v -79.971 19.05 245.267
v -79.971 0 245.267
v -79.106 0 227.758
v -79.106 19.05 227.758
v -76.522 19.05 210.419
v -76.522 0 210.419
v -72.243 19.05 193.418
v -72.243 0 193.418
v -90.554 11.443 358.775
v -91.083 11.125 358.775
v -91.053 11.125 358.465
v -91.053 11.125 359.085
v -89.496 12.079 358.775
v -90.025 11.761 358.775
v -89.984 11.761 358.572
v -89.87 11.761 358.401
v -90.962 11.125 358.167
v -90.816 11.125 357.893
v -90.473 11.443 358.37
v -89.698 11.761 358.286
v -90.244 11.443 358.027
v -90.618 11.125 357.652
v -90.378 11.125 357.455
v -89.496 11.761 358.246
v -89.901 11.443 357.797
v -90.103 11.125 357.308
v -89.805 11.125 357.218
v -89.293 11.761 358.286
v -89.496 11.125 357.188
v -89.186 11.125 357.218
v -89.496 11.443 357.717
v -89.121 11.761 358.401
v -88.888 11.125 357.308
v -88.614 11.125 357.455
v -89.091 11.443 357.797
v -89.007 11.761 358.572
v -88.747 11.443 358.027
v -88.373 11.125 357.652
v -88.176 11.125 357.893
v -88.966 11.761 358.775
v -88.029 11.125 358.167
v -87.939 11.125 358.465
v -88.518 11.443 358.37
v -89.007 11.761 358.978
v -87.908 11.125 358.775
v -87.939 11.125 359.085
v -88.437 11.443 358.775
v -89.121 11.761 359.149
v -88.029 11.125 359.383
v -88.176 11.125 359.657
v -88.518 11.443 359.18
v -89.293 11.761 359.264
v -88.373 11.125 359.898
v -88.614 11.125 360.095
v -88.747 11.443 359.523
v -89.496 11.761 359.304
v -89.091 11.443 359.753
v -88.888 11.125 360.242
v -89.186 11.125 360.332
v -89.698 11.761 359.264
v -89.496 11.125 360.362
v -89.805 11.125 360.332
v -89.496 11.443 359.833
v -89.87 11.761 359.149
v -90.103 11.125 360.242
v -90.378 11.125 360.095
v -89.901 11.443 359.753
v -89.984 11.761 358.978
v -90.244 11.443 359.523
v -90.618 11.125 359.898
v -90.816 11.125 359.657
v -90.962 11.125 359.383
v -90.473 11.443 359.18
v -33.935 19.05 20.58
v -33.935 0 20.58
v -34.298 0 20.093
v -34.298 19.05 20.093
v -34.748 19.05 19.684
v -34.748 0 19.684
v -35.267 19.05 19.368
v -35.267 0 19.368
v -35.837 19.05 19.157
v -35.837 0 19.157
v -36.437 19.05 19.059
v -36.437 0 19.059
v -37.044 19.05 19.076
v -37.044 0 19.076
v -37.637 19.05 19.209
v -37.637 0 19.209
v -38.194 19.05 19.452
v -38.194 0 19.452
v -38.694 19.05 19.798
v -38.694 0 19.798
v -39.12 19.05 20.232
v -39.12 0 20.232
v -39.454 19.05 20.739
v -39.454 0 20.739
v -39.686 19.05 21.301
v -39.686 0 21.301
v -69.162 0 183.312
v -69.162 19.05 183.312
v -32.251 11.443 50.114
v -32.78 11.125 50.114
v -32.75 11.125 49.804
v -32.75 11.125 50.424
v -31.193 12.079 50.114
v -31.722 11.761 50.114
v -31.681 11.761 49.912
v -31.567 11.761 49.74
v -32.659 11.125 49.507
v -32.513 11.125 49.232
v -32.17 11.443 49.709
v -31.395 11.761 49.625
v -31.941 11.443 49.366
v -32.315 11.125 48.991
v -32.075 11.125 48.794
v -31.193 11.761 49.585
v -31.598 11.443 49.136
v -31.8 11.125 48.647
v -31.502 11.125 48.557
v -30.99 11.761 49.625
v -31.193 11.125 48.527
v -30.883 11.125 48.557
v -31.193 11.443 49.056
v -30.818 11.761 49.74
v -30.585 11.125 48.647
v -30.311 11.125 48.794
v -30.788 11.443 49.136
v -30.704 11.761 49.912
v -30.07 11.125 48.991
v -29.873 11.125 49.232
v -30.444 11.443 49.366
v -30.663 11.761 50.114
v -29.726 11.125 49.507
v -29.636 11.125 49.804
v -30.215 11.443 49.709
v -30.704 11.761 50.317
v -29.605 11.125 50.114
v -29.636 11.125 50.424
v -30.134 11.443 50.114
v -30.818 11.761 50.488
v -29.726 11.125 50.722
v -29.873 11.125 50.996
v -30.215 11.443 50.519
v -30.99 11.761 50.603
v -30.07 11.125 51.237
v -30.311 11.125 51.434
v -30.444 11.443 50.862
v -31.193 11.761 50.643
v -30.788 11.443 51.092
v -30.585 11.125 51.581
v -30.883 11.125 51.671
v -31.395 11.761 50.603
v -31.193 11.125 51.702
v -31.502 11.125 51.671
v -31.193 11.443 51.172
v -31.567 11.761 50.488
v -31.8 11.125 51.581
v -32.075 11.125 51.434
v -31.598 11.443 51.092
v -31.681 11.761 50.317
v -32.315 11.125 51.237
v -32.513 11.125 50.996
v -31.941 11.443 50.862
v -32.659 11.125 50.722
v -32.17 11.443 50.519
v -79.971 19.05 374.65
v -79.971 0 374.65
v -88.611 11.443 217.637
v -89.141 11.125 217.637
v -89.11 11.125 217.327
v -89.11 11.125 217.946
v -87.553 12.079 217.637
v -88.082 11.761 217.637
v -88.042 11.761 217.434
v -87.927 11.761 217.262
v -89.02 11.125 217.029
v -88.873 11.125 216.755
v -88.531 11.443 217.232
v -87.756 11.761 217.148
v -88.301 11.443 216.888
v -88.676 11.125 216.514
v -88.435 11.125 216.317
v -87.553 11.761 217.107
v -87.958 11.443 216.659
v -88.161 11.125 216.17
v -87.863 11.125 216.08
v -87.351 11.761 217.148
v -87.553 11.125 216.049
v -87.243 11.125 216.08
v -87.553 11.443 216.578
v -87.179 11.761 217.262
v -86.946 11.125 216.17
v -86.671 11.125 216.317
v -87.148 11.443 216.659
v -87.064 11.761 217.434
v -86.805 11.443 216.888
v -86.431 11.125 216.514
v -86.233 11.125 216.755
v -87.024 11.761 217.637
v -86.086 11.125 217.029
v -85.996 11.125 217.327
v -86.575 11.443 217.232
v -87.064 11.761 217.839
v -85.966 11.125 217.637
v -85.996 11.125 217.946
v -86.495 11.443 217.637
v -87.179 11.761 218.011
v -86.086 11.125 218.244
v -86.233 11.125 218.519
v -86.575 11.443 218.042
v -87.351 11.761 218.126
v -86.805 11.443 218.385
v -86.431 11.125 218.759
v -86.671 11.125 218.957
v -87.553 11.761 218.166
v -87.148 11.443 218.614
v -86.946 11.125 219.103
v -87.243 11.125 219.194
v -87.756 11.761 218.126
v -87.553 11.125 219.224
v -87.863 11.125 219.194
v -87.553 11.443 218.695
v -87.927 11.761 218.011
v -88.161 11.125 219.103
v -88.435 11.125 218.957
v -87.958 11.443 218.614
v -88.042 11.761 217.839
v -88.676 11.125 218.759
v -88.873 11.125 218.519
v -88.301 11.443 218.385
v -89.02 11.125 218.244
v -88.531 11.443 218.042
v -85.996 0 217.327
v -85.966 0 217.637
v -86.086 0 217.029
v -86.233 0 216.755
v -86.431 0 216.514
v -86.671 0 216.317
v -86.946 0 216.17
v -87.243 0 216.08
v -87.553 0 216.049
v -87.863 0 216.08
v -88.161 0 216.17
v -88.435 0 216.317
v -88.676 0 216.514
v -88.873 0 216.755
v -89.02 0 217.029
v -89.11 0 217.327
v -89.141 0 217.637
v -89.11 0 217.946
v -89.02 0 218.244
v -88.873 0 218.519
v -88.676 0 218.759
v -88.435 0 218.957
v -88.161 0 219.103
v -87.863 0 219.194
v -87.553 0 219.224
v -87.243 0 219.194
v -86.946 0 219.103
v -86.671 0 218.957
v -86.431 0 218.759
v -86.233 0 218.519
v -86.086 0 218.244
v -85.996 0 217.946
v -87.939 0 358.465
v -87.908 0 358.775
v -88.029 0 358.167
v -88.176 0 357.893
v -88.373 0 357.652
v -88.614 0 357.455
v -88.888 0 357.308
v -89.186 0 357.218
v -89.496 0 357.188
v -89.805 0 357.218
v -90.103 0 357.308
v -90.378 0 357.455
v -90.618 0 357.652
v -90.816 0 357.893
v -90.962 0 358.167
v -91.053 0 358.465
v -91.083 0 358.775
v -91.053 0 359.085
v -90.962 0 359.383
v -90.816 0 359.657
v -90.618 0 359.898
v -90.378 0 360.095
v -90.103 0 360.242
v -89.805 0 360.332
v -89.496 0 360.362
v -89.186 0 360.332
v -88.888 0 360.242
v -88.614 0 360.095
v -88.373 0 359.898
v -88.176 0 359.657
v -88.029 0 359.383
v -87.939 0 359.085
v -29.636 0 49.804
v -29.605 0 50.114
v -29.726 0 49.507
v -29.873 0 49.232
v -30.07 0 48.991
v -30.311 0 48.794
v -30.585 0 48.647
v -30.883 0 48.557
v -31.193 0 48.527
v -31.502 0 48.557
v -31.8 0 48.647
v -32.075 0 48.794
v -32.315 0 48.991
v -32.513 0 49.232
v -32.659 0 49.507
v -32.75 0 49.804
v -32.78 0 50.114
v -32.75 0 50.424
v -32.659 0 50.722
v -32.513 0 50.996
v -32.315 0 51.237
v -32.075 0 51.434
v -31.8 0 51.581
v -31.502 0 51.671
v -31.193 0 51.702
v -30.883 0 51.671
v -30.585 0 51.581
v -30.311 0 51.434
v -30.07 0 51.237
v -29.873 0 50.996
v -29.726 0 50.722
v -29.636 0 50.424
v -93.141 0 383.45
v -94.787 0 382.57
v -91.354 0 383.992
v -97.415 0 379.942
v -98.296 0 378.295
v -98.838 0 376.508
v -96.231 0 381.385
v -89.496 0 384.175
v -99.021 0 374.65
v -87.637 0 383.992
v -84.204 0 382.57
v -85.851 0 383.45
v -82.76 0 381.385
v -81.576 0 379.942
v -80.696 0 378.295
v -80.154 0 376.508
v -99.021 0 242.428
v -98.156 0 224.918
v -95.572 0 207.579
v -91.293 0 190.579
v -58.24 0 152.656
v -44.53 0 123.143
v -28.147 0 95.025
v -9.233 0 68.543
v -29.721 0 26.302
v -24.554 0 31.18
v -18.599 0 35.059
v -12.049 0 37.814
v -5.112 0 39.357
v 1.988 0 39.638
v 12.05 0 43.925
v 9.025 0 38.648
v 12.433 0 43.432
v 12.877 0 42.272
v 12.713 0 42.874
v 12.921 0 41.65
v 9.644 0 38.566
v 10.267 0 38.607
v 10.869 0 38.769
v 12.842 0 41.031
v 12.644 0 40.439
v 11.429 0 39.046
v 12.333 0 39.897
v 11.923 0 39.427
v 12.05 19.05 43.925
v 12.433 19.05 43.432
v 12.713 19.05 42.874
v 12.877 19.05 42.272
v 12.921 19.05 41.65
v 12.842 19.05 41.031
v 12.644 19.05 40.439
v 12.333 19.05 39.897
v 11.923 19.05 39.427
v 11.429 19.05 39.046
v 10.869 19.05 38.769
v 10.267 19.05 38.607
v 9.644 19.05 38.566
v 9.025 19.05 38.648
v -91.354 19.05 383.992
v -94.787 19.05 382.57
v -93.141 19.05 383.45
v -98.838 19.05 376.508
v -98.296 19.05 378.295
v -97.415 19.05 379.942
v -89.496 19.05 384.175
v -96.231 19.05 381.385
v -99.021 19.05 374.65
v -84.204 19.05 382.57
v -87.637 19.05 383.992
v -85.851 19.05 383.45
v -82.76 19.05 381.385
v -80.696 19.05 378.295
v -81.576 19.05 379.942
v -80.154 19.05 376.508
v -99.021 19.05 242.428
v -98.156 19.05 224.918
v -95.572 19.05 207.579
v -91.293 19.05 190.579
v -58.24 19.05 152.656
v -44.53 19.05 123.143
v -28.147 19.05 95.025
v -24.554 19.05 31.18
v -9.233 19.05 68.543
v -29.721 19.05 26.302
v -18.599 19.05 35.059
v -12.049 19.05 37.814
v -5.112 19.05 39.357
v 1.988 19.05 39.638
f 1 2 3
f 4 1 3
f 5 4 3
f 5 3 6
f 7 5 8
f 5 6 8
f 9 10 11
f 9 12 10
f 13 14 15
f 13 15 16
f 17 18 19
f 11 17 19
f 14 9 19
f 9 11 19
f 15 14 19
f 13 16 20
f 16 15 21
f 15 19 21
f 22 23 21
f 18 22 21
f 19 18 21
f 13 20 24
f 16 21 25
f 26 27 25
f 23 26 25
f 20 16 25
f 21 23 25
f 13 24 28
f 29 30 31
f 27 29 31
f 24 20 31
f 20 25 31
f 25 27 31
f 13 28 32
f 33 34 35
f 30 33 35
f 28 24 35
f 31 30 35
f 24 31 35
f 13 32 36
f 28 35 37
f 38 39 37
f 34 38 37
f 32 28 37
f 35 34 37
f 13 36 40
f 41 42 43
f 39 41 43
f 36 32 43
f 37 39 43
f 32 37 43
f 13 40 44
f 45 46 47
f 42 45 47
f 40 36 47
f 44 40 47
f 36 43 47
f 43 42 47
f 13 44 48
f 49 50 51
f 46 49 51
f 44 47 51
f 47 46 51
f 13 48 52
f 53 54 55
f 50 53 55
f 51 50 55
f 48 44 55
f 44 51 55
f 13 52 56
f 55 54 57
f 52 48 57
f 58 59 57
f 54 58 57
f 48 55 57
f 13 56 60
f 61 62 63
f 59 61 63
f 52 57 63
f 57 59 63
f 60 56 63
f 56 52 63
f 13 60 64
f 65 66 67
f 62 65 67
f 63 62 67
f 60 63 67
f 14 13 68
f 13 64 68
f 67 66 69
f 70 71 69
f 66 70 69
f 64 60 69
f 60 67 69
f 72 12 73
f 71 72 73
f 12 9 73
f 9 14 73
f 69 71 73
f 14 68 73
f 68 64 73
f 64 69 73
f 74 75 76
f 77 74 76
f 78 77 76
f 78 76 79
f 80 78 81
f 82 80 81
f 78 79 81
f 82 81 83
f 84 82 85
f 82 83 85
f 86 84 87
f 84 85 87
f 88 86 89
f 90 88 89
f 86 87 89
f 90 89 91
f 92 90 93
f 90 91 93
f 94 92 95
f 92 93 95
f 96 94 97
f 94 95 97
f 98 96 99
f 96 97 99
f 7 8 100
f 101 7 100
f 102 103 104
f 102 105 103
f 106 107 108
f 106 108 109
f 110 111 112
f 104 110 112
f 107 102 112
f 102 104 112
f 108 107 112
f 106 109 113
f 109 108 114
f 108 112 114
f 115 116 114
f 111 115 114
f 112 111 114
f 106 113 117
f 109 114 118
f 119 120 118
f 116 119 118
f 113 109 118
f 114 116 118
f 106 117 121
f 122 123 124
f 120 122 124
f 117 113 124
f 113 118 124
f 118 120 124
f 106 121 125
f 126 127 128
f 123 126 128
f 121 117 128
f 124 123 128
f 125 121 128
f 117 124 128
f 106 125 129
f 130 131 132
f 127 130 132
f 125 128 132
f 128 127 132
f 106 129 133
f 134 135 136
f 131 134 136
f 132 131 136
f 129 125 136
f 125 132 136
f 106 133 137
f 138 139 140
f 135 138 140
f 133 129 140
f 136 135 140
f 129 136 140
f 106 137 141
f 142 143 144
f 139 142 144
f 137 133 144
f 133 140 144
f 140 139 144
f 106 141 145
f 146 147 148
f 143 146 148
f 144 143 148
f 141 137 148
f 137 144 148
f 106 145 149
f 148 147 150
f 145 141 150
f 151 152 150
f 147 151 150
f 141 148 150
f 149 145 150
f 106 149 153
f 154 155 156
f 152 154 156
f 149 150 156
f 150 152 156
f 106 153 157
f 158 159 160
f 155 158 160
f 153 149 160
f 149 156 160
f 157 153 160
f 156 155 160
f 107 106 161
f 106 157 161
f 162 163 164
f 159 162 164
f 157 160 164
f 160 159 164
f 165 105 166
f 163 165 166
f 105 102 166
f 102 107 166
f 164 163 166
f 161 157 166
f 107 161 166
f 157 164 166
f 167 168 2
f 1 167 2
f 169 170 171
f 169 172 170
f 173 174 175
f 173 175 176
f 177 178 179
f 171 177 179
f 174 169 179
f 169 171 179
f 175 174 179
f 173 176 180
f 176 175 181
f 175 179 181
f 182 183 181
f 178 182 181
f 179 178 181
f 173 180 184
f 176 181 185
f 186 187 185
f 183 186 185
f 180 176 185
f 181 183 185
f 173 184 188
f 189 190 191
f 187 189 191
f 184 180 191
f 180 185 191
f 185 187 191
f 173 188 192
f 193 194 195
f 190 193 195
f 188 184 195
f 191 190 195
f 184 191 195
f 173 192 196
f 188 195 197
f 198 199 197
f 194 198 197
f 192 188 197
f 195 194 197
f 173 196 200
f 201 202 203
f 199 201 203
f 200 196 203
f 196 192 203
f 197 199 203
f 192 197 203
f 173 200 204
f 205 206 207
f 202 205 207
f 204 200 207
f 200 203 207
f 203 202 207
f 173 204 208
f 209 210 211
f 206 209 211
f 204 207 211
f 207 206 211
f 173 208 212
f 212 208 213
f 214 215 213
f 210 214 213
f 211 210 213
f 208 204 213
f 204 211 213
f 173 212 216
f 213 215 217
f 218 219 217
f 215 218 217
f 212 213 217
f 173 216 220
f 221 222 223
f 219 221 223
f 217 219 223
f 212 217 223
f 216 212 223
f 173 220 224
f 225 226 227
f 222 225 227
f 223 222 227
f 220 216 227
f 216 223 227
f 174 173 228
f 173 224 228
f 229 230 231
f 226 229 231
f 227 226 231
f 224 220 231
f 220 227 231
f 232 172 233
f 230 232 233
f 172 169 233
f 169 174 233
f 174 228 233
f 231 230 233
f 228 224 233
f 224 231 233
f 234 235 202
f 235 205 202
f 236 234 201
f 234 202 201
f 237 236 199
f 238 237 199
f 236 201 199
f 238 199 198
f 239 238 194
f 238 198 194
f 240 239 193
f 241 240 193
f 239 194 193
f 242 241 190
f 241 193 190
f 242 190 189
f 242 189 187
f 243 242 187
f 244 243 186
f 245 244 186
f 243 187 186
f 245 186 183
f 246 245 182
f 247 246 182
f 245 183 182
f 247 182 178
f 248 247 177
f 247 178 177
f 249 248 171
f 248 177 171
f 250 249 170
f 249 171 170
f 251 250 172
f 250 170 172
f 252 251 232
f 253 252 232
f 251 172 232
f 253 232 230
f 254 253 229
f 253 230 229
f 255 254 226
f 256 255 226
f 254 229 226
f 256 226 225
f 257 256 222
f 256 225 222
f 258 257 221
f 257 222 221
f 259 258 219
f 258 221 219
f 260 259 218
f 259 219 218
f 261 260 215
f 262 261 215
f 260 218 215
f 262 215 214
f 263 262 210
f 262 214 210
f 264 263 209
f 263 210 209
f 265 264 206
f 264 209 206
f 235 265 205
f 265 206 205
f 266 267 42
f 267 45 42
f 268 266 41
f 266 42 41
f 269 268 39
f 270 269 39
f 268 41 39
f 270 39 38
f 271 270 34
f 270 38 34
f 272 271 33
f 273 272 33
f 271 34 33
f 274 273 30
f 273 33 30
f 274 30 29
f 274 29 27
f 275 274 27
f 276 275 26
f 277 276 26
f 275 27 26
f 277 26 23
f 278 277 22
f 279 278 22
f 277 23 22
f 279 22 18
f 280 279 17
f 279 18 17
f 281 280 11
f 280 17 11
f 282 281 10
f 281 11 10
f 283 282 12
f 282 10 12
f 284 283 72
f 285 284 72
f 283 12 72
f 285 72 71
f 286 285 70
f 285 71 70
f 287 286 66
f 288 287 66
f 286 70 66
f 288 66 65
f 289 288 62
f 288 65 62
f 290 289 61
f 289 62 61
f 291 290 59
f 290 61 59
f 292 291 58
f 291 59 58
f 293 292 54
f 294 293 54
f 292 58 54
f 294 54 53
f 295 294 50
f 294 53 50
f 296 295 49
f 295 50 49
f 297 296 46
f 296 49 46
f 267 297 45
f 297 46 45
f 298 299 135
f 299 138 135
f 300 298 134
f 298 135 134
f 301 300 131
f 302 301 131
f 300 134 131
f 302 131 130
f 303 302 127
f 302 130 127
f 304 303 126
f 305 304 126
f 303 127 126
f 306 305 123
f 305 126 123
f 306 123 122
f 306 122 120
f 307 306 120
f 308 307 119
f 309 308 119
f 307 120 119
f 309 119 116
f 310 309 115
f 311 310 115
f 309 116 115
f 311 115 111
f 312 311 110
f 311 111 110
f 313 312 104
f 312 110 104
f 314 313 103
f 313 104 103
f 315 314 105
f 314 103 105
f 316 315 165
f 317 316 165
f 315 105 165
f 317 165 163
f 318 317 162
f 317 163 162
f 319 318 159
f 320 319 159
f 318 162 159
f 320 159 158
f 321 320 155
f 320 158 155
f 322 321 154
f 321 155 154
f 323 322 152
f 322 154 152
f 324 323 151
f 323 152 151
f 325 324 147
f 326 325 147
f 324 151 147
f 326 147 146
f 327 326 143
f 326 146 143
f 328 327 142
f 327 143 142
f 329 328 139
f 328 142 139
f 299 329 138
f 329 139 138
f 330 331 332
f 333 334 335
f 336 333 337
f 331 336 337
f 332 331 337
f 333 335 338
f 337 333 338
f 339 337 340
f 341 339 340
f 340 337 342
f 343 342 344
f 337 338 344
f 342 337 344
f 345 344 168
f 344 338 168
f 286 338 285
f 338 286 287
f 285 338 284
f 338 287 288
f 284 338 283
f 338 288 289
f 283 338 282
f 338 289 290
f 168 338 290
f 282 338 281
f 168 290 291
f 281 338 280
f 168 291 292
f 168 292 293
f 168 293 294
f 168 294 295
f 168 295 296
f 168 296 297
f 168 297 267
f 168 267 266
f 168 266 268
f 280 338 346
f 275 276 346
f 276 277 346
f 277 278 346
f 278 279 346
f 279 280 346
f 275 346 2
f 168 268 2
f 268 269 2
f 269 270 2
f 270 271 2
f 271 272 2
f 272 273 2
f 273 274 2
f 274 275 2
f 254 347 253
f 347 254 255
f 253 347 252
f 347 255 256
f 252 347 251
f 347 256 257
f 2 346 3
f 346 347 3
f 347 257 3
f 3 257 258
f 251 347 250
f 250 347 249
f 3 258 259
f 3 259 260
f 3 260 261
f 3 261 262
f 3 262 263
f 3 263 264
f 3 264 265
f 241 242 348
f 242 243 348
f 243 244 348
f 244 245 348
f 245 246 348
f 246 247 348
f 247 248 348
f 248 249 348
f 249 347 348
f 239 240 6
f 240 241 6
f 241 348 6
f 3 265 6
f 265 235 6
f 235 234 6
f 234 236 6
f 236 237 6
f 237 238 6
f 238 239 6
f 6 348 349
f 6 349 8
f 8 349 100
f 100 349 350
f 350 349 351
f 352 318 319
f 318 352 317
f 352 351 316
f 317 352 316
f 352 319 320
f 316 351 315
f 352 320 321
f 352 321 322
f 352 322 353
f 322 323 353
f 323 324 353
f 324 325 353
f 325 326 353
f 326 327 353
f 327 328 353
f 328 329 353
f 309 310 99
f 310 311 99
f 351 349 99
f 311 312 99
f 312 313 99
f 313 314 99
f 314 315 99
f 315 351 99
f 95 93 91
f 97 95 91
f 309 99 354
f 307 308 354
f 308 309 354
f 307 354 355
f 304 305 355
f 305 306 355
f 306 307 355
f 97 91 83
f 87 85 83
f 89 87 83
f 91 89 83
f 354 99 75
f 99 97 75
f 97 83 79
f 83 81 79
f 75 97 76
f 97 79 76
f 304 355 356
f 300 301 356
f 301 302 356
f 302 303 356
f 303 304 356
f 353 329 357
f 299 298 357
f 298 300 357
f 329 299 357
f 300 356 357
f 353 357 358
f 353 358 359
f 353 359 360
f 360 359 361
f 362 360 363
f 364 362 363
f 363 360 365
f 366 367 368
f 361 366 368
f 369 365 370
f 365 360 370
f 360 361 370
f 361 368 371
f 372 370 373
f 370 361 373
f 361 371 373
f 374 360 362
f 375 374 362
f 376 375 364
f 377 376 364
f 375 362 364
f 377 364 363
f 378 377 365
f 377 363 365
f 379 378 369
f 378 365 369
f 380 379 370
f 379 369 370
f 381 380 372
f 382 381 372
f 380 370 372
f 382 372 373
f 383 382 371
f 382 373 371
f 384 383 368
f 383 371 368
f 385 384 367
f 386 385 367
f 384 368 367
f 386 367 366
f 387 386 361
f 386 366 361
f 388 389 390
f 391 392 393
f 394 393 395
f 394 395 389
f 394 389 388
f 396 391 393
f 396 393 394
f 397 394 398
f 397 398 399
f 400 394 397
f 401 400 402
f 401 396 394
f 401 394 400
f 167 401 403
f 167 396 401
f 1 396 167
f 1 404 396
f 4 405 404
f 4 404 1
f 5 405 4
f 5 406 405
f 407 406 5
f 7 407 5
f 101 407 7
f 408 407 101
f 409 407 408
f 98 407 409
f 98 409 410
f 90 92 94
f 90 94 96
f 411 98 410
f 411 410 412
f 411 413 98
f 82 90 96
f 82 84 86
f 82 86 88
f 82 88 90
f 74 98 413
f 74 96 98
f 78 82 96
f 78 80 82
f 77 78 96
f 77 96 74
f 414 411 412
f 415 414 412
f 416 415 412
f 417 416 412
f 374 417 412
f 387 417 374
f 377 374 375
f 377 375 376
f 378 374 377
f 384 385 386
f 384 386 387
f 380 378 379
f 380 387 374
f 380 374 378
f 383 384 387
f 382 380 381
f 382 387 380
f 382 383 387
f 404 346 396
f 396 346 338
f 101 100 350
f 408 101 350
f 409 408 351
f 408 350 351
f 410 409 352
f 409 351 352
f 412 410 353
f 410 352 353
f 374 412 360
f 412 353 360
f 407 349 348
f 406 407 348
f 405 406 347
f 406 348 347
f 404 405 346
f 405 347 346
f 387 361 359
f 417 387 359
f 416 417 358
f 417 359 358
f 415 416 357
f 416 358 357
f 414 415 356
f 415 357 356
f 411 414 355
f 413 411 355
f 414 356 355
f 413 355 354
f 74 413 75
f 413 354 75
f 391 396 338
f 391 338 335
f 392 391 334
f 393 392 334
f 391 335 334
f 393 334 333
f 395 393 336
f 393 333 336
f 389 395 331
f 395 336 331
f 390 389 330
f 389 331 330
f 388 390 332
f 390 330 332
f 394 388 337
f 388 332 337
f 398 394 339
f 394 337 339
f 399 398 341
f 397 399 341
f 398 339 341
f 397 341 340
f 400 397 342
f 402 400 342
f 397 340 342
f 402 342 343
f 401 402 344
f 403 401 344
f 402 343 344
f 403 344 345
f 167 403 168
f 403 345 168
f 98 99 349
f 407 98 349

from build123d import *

# Parameters (mm, degrees)
BOSS_EXTRUDE1_DEPTH              = 19.05
F_1_8_0_125_DIAMETER_HOLE1_D     = 3.175
F_1_8_0_125_DIAMETER_HOLE1_DEPTH = 11.1252
F_1_8_0_125_DIAMETER_HOLE1_TIP   = 0.953866233


with BuildPart() as part:
    # Sketch1 → Boss-Extrude1 (new body)
    with BuildSketch(Plane(origin=(0, 0, 0), x_dir=(1, 0, 0), z_dir=(0, 1, 0))):
        with BuildLine():
            Line((-99.020583087, -242.427582229), (-99.020583087, -374.65))
            ThreePointArc((-99.020583087, -374.65), (-89.495583087, -384.175), (-79.970583087, -374.65))
            Line((-79.970583087, -374.65), (-79.970583087, -245.266880288))
            ThreePointArc((-79.970583087, -245.266880288), (-78.028039526, -219.05629054), (-72.242855135, -193.418425341))
            Line((-72.242855135, -193.418425341), (-69.161727013, -183.311770075))
            ThreePointArc((-69.161727013, -183.311770075), (-36.664014716, -108.894116093), (12.050429612, -43.924958467))
            ThreePointArc((12.050429612, -43.924958467), (12.501856954, -40.160483954), (9.02530478, -38.647658789))
            ThreePointArc((9.02530478, -38.647658789), (-15.385960803, -36.583737732), (-33.934614128, -20.580078236))
            ThreePointArc((-33.934614128, -20.580078236), (-37.044039814, -19.076108136), (-39.686388117, -21.300619228))
            Line((-39.686388117, -21.300619228), (-91.292855135, -190.579127282))
            ThreePointArc((-91.292855135, -190.579127282), (-97.078039526, -216.216992482), (-99.020583087, -242.427582229))
        make_face()
    extrude(amount=BOSS_EXTRUDE1_DEPTH)

    # 1/8 (0.125) Diameter Hole1
    with Locations(Plane(origin=(0, 0, 0), x_dir=(-1, 0, 0), z_dir=(0, -1, 0))):
        with Locations((89.495583087, -358.775), (31.192579134, -50.114011233), (87.553039526, -217.636641511)):
            Hole(F_1_8_0_125_DIAMETER_HOLE1_D / 2, depth=F_1_8_0_125_DIAMETER_HOLE1_DEPTH)
            with Locations((0, 0, -(F_1_8_0_125_DIAMETER_HOLE1_DEPTH + F_1_8_0_125_DIAMETER_HOLE1_TIP / 2))):  # 118° drill point
                Cone(0, F_1_8_0_125_DIAMETER_HOLE1_D / 2, F_1_8_0_125_DIAMETER_HOLE1_TIP, mode=Mode.SUBTRACT)


solid = part.part
